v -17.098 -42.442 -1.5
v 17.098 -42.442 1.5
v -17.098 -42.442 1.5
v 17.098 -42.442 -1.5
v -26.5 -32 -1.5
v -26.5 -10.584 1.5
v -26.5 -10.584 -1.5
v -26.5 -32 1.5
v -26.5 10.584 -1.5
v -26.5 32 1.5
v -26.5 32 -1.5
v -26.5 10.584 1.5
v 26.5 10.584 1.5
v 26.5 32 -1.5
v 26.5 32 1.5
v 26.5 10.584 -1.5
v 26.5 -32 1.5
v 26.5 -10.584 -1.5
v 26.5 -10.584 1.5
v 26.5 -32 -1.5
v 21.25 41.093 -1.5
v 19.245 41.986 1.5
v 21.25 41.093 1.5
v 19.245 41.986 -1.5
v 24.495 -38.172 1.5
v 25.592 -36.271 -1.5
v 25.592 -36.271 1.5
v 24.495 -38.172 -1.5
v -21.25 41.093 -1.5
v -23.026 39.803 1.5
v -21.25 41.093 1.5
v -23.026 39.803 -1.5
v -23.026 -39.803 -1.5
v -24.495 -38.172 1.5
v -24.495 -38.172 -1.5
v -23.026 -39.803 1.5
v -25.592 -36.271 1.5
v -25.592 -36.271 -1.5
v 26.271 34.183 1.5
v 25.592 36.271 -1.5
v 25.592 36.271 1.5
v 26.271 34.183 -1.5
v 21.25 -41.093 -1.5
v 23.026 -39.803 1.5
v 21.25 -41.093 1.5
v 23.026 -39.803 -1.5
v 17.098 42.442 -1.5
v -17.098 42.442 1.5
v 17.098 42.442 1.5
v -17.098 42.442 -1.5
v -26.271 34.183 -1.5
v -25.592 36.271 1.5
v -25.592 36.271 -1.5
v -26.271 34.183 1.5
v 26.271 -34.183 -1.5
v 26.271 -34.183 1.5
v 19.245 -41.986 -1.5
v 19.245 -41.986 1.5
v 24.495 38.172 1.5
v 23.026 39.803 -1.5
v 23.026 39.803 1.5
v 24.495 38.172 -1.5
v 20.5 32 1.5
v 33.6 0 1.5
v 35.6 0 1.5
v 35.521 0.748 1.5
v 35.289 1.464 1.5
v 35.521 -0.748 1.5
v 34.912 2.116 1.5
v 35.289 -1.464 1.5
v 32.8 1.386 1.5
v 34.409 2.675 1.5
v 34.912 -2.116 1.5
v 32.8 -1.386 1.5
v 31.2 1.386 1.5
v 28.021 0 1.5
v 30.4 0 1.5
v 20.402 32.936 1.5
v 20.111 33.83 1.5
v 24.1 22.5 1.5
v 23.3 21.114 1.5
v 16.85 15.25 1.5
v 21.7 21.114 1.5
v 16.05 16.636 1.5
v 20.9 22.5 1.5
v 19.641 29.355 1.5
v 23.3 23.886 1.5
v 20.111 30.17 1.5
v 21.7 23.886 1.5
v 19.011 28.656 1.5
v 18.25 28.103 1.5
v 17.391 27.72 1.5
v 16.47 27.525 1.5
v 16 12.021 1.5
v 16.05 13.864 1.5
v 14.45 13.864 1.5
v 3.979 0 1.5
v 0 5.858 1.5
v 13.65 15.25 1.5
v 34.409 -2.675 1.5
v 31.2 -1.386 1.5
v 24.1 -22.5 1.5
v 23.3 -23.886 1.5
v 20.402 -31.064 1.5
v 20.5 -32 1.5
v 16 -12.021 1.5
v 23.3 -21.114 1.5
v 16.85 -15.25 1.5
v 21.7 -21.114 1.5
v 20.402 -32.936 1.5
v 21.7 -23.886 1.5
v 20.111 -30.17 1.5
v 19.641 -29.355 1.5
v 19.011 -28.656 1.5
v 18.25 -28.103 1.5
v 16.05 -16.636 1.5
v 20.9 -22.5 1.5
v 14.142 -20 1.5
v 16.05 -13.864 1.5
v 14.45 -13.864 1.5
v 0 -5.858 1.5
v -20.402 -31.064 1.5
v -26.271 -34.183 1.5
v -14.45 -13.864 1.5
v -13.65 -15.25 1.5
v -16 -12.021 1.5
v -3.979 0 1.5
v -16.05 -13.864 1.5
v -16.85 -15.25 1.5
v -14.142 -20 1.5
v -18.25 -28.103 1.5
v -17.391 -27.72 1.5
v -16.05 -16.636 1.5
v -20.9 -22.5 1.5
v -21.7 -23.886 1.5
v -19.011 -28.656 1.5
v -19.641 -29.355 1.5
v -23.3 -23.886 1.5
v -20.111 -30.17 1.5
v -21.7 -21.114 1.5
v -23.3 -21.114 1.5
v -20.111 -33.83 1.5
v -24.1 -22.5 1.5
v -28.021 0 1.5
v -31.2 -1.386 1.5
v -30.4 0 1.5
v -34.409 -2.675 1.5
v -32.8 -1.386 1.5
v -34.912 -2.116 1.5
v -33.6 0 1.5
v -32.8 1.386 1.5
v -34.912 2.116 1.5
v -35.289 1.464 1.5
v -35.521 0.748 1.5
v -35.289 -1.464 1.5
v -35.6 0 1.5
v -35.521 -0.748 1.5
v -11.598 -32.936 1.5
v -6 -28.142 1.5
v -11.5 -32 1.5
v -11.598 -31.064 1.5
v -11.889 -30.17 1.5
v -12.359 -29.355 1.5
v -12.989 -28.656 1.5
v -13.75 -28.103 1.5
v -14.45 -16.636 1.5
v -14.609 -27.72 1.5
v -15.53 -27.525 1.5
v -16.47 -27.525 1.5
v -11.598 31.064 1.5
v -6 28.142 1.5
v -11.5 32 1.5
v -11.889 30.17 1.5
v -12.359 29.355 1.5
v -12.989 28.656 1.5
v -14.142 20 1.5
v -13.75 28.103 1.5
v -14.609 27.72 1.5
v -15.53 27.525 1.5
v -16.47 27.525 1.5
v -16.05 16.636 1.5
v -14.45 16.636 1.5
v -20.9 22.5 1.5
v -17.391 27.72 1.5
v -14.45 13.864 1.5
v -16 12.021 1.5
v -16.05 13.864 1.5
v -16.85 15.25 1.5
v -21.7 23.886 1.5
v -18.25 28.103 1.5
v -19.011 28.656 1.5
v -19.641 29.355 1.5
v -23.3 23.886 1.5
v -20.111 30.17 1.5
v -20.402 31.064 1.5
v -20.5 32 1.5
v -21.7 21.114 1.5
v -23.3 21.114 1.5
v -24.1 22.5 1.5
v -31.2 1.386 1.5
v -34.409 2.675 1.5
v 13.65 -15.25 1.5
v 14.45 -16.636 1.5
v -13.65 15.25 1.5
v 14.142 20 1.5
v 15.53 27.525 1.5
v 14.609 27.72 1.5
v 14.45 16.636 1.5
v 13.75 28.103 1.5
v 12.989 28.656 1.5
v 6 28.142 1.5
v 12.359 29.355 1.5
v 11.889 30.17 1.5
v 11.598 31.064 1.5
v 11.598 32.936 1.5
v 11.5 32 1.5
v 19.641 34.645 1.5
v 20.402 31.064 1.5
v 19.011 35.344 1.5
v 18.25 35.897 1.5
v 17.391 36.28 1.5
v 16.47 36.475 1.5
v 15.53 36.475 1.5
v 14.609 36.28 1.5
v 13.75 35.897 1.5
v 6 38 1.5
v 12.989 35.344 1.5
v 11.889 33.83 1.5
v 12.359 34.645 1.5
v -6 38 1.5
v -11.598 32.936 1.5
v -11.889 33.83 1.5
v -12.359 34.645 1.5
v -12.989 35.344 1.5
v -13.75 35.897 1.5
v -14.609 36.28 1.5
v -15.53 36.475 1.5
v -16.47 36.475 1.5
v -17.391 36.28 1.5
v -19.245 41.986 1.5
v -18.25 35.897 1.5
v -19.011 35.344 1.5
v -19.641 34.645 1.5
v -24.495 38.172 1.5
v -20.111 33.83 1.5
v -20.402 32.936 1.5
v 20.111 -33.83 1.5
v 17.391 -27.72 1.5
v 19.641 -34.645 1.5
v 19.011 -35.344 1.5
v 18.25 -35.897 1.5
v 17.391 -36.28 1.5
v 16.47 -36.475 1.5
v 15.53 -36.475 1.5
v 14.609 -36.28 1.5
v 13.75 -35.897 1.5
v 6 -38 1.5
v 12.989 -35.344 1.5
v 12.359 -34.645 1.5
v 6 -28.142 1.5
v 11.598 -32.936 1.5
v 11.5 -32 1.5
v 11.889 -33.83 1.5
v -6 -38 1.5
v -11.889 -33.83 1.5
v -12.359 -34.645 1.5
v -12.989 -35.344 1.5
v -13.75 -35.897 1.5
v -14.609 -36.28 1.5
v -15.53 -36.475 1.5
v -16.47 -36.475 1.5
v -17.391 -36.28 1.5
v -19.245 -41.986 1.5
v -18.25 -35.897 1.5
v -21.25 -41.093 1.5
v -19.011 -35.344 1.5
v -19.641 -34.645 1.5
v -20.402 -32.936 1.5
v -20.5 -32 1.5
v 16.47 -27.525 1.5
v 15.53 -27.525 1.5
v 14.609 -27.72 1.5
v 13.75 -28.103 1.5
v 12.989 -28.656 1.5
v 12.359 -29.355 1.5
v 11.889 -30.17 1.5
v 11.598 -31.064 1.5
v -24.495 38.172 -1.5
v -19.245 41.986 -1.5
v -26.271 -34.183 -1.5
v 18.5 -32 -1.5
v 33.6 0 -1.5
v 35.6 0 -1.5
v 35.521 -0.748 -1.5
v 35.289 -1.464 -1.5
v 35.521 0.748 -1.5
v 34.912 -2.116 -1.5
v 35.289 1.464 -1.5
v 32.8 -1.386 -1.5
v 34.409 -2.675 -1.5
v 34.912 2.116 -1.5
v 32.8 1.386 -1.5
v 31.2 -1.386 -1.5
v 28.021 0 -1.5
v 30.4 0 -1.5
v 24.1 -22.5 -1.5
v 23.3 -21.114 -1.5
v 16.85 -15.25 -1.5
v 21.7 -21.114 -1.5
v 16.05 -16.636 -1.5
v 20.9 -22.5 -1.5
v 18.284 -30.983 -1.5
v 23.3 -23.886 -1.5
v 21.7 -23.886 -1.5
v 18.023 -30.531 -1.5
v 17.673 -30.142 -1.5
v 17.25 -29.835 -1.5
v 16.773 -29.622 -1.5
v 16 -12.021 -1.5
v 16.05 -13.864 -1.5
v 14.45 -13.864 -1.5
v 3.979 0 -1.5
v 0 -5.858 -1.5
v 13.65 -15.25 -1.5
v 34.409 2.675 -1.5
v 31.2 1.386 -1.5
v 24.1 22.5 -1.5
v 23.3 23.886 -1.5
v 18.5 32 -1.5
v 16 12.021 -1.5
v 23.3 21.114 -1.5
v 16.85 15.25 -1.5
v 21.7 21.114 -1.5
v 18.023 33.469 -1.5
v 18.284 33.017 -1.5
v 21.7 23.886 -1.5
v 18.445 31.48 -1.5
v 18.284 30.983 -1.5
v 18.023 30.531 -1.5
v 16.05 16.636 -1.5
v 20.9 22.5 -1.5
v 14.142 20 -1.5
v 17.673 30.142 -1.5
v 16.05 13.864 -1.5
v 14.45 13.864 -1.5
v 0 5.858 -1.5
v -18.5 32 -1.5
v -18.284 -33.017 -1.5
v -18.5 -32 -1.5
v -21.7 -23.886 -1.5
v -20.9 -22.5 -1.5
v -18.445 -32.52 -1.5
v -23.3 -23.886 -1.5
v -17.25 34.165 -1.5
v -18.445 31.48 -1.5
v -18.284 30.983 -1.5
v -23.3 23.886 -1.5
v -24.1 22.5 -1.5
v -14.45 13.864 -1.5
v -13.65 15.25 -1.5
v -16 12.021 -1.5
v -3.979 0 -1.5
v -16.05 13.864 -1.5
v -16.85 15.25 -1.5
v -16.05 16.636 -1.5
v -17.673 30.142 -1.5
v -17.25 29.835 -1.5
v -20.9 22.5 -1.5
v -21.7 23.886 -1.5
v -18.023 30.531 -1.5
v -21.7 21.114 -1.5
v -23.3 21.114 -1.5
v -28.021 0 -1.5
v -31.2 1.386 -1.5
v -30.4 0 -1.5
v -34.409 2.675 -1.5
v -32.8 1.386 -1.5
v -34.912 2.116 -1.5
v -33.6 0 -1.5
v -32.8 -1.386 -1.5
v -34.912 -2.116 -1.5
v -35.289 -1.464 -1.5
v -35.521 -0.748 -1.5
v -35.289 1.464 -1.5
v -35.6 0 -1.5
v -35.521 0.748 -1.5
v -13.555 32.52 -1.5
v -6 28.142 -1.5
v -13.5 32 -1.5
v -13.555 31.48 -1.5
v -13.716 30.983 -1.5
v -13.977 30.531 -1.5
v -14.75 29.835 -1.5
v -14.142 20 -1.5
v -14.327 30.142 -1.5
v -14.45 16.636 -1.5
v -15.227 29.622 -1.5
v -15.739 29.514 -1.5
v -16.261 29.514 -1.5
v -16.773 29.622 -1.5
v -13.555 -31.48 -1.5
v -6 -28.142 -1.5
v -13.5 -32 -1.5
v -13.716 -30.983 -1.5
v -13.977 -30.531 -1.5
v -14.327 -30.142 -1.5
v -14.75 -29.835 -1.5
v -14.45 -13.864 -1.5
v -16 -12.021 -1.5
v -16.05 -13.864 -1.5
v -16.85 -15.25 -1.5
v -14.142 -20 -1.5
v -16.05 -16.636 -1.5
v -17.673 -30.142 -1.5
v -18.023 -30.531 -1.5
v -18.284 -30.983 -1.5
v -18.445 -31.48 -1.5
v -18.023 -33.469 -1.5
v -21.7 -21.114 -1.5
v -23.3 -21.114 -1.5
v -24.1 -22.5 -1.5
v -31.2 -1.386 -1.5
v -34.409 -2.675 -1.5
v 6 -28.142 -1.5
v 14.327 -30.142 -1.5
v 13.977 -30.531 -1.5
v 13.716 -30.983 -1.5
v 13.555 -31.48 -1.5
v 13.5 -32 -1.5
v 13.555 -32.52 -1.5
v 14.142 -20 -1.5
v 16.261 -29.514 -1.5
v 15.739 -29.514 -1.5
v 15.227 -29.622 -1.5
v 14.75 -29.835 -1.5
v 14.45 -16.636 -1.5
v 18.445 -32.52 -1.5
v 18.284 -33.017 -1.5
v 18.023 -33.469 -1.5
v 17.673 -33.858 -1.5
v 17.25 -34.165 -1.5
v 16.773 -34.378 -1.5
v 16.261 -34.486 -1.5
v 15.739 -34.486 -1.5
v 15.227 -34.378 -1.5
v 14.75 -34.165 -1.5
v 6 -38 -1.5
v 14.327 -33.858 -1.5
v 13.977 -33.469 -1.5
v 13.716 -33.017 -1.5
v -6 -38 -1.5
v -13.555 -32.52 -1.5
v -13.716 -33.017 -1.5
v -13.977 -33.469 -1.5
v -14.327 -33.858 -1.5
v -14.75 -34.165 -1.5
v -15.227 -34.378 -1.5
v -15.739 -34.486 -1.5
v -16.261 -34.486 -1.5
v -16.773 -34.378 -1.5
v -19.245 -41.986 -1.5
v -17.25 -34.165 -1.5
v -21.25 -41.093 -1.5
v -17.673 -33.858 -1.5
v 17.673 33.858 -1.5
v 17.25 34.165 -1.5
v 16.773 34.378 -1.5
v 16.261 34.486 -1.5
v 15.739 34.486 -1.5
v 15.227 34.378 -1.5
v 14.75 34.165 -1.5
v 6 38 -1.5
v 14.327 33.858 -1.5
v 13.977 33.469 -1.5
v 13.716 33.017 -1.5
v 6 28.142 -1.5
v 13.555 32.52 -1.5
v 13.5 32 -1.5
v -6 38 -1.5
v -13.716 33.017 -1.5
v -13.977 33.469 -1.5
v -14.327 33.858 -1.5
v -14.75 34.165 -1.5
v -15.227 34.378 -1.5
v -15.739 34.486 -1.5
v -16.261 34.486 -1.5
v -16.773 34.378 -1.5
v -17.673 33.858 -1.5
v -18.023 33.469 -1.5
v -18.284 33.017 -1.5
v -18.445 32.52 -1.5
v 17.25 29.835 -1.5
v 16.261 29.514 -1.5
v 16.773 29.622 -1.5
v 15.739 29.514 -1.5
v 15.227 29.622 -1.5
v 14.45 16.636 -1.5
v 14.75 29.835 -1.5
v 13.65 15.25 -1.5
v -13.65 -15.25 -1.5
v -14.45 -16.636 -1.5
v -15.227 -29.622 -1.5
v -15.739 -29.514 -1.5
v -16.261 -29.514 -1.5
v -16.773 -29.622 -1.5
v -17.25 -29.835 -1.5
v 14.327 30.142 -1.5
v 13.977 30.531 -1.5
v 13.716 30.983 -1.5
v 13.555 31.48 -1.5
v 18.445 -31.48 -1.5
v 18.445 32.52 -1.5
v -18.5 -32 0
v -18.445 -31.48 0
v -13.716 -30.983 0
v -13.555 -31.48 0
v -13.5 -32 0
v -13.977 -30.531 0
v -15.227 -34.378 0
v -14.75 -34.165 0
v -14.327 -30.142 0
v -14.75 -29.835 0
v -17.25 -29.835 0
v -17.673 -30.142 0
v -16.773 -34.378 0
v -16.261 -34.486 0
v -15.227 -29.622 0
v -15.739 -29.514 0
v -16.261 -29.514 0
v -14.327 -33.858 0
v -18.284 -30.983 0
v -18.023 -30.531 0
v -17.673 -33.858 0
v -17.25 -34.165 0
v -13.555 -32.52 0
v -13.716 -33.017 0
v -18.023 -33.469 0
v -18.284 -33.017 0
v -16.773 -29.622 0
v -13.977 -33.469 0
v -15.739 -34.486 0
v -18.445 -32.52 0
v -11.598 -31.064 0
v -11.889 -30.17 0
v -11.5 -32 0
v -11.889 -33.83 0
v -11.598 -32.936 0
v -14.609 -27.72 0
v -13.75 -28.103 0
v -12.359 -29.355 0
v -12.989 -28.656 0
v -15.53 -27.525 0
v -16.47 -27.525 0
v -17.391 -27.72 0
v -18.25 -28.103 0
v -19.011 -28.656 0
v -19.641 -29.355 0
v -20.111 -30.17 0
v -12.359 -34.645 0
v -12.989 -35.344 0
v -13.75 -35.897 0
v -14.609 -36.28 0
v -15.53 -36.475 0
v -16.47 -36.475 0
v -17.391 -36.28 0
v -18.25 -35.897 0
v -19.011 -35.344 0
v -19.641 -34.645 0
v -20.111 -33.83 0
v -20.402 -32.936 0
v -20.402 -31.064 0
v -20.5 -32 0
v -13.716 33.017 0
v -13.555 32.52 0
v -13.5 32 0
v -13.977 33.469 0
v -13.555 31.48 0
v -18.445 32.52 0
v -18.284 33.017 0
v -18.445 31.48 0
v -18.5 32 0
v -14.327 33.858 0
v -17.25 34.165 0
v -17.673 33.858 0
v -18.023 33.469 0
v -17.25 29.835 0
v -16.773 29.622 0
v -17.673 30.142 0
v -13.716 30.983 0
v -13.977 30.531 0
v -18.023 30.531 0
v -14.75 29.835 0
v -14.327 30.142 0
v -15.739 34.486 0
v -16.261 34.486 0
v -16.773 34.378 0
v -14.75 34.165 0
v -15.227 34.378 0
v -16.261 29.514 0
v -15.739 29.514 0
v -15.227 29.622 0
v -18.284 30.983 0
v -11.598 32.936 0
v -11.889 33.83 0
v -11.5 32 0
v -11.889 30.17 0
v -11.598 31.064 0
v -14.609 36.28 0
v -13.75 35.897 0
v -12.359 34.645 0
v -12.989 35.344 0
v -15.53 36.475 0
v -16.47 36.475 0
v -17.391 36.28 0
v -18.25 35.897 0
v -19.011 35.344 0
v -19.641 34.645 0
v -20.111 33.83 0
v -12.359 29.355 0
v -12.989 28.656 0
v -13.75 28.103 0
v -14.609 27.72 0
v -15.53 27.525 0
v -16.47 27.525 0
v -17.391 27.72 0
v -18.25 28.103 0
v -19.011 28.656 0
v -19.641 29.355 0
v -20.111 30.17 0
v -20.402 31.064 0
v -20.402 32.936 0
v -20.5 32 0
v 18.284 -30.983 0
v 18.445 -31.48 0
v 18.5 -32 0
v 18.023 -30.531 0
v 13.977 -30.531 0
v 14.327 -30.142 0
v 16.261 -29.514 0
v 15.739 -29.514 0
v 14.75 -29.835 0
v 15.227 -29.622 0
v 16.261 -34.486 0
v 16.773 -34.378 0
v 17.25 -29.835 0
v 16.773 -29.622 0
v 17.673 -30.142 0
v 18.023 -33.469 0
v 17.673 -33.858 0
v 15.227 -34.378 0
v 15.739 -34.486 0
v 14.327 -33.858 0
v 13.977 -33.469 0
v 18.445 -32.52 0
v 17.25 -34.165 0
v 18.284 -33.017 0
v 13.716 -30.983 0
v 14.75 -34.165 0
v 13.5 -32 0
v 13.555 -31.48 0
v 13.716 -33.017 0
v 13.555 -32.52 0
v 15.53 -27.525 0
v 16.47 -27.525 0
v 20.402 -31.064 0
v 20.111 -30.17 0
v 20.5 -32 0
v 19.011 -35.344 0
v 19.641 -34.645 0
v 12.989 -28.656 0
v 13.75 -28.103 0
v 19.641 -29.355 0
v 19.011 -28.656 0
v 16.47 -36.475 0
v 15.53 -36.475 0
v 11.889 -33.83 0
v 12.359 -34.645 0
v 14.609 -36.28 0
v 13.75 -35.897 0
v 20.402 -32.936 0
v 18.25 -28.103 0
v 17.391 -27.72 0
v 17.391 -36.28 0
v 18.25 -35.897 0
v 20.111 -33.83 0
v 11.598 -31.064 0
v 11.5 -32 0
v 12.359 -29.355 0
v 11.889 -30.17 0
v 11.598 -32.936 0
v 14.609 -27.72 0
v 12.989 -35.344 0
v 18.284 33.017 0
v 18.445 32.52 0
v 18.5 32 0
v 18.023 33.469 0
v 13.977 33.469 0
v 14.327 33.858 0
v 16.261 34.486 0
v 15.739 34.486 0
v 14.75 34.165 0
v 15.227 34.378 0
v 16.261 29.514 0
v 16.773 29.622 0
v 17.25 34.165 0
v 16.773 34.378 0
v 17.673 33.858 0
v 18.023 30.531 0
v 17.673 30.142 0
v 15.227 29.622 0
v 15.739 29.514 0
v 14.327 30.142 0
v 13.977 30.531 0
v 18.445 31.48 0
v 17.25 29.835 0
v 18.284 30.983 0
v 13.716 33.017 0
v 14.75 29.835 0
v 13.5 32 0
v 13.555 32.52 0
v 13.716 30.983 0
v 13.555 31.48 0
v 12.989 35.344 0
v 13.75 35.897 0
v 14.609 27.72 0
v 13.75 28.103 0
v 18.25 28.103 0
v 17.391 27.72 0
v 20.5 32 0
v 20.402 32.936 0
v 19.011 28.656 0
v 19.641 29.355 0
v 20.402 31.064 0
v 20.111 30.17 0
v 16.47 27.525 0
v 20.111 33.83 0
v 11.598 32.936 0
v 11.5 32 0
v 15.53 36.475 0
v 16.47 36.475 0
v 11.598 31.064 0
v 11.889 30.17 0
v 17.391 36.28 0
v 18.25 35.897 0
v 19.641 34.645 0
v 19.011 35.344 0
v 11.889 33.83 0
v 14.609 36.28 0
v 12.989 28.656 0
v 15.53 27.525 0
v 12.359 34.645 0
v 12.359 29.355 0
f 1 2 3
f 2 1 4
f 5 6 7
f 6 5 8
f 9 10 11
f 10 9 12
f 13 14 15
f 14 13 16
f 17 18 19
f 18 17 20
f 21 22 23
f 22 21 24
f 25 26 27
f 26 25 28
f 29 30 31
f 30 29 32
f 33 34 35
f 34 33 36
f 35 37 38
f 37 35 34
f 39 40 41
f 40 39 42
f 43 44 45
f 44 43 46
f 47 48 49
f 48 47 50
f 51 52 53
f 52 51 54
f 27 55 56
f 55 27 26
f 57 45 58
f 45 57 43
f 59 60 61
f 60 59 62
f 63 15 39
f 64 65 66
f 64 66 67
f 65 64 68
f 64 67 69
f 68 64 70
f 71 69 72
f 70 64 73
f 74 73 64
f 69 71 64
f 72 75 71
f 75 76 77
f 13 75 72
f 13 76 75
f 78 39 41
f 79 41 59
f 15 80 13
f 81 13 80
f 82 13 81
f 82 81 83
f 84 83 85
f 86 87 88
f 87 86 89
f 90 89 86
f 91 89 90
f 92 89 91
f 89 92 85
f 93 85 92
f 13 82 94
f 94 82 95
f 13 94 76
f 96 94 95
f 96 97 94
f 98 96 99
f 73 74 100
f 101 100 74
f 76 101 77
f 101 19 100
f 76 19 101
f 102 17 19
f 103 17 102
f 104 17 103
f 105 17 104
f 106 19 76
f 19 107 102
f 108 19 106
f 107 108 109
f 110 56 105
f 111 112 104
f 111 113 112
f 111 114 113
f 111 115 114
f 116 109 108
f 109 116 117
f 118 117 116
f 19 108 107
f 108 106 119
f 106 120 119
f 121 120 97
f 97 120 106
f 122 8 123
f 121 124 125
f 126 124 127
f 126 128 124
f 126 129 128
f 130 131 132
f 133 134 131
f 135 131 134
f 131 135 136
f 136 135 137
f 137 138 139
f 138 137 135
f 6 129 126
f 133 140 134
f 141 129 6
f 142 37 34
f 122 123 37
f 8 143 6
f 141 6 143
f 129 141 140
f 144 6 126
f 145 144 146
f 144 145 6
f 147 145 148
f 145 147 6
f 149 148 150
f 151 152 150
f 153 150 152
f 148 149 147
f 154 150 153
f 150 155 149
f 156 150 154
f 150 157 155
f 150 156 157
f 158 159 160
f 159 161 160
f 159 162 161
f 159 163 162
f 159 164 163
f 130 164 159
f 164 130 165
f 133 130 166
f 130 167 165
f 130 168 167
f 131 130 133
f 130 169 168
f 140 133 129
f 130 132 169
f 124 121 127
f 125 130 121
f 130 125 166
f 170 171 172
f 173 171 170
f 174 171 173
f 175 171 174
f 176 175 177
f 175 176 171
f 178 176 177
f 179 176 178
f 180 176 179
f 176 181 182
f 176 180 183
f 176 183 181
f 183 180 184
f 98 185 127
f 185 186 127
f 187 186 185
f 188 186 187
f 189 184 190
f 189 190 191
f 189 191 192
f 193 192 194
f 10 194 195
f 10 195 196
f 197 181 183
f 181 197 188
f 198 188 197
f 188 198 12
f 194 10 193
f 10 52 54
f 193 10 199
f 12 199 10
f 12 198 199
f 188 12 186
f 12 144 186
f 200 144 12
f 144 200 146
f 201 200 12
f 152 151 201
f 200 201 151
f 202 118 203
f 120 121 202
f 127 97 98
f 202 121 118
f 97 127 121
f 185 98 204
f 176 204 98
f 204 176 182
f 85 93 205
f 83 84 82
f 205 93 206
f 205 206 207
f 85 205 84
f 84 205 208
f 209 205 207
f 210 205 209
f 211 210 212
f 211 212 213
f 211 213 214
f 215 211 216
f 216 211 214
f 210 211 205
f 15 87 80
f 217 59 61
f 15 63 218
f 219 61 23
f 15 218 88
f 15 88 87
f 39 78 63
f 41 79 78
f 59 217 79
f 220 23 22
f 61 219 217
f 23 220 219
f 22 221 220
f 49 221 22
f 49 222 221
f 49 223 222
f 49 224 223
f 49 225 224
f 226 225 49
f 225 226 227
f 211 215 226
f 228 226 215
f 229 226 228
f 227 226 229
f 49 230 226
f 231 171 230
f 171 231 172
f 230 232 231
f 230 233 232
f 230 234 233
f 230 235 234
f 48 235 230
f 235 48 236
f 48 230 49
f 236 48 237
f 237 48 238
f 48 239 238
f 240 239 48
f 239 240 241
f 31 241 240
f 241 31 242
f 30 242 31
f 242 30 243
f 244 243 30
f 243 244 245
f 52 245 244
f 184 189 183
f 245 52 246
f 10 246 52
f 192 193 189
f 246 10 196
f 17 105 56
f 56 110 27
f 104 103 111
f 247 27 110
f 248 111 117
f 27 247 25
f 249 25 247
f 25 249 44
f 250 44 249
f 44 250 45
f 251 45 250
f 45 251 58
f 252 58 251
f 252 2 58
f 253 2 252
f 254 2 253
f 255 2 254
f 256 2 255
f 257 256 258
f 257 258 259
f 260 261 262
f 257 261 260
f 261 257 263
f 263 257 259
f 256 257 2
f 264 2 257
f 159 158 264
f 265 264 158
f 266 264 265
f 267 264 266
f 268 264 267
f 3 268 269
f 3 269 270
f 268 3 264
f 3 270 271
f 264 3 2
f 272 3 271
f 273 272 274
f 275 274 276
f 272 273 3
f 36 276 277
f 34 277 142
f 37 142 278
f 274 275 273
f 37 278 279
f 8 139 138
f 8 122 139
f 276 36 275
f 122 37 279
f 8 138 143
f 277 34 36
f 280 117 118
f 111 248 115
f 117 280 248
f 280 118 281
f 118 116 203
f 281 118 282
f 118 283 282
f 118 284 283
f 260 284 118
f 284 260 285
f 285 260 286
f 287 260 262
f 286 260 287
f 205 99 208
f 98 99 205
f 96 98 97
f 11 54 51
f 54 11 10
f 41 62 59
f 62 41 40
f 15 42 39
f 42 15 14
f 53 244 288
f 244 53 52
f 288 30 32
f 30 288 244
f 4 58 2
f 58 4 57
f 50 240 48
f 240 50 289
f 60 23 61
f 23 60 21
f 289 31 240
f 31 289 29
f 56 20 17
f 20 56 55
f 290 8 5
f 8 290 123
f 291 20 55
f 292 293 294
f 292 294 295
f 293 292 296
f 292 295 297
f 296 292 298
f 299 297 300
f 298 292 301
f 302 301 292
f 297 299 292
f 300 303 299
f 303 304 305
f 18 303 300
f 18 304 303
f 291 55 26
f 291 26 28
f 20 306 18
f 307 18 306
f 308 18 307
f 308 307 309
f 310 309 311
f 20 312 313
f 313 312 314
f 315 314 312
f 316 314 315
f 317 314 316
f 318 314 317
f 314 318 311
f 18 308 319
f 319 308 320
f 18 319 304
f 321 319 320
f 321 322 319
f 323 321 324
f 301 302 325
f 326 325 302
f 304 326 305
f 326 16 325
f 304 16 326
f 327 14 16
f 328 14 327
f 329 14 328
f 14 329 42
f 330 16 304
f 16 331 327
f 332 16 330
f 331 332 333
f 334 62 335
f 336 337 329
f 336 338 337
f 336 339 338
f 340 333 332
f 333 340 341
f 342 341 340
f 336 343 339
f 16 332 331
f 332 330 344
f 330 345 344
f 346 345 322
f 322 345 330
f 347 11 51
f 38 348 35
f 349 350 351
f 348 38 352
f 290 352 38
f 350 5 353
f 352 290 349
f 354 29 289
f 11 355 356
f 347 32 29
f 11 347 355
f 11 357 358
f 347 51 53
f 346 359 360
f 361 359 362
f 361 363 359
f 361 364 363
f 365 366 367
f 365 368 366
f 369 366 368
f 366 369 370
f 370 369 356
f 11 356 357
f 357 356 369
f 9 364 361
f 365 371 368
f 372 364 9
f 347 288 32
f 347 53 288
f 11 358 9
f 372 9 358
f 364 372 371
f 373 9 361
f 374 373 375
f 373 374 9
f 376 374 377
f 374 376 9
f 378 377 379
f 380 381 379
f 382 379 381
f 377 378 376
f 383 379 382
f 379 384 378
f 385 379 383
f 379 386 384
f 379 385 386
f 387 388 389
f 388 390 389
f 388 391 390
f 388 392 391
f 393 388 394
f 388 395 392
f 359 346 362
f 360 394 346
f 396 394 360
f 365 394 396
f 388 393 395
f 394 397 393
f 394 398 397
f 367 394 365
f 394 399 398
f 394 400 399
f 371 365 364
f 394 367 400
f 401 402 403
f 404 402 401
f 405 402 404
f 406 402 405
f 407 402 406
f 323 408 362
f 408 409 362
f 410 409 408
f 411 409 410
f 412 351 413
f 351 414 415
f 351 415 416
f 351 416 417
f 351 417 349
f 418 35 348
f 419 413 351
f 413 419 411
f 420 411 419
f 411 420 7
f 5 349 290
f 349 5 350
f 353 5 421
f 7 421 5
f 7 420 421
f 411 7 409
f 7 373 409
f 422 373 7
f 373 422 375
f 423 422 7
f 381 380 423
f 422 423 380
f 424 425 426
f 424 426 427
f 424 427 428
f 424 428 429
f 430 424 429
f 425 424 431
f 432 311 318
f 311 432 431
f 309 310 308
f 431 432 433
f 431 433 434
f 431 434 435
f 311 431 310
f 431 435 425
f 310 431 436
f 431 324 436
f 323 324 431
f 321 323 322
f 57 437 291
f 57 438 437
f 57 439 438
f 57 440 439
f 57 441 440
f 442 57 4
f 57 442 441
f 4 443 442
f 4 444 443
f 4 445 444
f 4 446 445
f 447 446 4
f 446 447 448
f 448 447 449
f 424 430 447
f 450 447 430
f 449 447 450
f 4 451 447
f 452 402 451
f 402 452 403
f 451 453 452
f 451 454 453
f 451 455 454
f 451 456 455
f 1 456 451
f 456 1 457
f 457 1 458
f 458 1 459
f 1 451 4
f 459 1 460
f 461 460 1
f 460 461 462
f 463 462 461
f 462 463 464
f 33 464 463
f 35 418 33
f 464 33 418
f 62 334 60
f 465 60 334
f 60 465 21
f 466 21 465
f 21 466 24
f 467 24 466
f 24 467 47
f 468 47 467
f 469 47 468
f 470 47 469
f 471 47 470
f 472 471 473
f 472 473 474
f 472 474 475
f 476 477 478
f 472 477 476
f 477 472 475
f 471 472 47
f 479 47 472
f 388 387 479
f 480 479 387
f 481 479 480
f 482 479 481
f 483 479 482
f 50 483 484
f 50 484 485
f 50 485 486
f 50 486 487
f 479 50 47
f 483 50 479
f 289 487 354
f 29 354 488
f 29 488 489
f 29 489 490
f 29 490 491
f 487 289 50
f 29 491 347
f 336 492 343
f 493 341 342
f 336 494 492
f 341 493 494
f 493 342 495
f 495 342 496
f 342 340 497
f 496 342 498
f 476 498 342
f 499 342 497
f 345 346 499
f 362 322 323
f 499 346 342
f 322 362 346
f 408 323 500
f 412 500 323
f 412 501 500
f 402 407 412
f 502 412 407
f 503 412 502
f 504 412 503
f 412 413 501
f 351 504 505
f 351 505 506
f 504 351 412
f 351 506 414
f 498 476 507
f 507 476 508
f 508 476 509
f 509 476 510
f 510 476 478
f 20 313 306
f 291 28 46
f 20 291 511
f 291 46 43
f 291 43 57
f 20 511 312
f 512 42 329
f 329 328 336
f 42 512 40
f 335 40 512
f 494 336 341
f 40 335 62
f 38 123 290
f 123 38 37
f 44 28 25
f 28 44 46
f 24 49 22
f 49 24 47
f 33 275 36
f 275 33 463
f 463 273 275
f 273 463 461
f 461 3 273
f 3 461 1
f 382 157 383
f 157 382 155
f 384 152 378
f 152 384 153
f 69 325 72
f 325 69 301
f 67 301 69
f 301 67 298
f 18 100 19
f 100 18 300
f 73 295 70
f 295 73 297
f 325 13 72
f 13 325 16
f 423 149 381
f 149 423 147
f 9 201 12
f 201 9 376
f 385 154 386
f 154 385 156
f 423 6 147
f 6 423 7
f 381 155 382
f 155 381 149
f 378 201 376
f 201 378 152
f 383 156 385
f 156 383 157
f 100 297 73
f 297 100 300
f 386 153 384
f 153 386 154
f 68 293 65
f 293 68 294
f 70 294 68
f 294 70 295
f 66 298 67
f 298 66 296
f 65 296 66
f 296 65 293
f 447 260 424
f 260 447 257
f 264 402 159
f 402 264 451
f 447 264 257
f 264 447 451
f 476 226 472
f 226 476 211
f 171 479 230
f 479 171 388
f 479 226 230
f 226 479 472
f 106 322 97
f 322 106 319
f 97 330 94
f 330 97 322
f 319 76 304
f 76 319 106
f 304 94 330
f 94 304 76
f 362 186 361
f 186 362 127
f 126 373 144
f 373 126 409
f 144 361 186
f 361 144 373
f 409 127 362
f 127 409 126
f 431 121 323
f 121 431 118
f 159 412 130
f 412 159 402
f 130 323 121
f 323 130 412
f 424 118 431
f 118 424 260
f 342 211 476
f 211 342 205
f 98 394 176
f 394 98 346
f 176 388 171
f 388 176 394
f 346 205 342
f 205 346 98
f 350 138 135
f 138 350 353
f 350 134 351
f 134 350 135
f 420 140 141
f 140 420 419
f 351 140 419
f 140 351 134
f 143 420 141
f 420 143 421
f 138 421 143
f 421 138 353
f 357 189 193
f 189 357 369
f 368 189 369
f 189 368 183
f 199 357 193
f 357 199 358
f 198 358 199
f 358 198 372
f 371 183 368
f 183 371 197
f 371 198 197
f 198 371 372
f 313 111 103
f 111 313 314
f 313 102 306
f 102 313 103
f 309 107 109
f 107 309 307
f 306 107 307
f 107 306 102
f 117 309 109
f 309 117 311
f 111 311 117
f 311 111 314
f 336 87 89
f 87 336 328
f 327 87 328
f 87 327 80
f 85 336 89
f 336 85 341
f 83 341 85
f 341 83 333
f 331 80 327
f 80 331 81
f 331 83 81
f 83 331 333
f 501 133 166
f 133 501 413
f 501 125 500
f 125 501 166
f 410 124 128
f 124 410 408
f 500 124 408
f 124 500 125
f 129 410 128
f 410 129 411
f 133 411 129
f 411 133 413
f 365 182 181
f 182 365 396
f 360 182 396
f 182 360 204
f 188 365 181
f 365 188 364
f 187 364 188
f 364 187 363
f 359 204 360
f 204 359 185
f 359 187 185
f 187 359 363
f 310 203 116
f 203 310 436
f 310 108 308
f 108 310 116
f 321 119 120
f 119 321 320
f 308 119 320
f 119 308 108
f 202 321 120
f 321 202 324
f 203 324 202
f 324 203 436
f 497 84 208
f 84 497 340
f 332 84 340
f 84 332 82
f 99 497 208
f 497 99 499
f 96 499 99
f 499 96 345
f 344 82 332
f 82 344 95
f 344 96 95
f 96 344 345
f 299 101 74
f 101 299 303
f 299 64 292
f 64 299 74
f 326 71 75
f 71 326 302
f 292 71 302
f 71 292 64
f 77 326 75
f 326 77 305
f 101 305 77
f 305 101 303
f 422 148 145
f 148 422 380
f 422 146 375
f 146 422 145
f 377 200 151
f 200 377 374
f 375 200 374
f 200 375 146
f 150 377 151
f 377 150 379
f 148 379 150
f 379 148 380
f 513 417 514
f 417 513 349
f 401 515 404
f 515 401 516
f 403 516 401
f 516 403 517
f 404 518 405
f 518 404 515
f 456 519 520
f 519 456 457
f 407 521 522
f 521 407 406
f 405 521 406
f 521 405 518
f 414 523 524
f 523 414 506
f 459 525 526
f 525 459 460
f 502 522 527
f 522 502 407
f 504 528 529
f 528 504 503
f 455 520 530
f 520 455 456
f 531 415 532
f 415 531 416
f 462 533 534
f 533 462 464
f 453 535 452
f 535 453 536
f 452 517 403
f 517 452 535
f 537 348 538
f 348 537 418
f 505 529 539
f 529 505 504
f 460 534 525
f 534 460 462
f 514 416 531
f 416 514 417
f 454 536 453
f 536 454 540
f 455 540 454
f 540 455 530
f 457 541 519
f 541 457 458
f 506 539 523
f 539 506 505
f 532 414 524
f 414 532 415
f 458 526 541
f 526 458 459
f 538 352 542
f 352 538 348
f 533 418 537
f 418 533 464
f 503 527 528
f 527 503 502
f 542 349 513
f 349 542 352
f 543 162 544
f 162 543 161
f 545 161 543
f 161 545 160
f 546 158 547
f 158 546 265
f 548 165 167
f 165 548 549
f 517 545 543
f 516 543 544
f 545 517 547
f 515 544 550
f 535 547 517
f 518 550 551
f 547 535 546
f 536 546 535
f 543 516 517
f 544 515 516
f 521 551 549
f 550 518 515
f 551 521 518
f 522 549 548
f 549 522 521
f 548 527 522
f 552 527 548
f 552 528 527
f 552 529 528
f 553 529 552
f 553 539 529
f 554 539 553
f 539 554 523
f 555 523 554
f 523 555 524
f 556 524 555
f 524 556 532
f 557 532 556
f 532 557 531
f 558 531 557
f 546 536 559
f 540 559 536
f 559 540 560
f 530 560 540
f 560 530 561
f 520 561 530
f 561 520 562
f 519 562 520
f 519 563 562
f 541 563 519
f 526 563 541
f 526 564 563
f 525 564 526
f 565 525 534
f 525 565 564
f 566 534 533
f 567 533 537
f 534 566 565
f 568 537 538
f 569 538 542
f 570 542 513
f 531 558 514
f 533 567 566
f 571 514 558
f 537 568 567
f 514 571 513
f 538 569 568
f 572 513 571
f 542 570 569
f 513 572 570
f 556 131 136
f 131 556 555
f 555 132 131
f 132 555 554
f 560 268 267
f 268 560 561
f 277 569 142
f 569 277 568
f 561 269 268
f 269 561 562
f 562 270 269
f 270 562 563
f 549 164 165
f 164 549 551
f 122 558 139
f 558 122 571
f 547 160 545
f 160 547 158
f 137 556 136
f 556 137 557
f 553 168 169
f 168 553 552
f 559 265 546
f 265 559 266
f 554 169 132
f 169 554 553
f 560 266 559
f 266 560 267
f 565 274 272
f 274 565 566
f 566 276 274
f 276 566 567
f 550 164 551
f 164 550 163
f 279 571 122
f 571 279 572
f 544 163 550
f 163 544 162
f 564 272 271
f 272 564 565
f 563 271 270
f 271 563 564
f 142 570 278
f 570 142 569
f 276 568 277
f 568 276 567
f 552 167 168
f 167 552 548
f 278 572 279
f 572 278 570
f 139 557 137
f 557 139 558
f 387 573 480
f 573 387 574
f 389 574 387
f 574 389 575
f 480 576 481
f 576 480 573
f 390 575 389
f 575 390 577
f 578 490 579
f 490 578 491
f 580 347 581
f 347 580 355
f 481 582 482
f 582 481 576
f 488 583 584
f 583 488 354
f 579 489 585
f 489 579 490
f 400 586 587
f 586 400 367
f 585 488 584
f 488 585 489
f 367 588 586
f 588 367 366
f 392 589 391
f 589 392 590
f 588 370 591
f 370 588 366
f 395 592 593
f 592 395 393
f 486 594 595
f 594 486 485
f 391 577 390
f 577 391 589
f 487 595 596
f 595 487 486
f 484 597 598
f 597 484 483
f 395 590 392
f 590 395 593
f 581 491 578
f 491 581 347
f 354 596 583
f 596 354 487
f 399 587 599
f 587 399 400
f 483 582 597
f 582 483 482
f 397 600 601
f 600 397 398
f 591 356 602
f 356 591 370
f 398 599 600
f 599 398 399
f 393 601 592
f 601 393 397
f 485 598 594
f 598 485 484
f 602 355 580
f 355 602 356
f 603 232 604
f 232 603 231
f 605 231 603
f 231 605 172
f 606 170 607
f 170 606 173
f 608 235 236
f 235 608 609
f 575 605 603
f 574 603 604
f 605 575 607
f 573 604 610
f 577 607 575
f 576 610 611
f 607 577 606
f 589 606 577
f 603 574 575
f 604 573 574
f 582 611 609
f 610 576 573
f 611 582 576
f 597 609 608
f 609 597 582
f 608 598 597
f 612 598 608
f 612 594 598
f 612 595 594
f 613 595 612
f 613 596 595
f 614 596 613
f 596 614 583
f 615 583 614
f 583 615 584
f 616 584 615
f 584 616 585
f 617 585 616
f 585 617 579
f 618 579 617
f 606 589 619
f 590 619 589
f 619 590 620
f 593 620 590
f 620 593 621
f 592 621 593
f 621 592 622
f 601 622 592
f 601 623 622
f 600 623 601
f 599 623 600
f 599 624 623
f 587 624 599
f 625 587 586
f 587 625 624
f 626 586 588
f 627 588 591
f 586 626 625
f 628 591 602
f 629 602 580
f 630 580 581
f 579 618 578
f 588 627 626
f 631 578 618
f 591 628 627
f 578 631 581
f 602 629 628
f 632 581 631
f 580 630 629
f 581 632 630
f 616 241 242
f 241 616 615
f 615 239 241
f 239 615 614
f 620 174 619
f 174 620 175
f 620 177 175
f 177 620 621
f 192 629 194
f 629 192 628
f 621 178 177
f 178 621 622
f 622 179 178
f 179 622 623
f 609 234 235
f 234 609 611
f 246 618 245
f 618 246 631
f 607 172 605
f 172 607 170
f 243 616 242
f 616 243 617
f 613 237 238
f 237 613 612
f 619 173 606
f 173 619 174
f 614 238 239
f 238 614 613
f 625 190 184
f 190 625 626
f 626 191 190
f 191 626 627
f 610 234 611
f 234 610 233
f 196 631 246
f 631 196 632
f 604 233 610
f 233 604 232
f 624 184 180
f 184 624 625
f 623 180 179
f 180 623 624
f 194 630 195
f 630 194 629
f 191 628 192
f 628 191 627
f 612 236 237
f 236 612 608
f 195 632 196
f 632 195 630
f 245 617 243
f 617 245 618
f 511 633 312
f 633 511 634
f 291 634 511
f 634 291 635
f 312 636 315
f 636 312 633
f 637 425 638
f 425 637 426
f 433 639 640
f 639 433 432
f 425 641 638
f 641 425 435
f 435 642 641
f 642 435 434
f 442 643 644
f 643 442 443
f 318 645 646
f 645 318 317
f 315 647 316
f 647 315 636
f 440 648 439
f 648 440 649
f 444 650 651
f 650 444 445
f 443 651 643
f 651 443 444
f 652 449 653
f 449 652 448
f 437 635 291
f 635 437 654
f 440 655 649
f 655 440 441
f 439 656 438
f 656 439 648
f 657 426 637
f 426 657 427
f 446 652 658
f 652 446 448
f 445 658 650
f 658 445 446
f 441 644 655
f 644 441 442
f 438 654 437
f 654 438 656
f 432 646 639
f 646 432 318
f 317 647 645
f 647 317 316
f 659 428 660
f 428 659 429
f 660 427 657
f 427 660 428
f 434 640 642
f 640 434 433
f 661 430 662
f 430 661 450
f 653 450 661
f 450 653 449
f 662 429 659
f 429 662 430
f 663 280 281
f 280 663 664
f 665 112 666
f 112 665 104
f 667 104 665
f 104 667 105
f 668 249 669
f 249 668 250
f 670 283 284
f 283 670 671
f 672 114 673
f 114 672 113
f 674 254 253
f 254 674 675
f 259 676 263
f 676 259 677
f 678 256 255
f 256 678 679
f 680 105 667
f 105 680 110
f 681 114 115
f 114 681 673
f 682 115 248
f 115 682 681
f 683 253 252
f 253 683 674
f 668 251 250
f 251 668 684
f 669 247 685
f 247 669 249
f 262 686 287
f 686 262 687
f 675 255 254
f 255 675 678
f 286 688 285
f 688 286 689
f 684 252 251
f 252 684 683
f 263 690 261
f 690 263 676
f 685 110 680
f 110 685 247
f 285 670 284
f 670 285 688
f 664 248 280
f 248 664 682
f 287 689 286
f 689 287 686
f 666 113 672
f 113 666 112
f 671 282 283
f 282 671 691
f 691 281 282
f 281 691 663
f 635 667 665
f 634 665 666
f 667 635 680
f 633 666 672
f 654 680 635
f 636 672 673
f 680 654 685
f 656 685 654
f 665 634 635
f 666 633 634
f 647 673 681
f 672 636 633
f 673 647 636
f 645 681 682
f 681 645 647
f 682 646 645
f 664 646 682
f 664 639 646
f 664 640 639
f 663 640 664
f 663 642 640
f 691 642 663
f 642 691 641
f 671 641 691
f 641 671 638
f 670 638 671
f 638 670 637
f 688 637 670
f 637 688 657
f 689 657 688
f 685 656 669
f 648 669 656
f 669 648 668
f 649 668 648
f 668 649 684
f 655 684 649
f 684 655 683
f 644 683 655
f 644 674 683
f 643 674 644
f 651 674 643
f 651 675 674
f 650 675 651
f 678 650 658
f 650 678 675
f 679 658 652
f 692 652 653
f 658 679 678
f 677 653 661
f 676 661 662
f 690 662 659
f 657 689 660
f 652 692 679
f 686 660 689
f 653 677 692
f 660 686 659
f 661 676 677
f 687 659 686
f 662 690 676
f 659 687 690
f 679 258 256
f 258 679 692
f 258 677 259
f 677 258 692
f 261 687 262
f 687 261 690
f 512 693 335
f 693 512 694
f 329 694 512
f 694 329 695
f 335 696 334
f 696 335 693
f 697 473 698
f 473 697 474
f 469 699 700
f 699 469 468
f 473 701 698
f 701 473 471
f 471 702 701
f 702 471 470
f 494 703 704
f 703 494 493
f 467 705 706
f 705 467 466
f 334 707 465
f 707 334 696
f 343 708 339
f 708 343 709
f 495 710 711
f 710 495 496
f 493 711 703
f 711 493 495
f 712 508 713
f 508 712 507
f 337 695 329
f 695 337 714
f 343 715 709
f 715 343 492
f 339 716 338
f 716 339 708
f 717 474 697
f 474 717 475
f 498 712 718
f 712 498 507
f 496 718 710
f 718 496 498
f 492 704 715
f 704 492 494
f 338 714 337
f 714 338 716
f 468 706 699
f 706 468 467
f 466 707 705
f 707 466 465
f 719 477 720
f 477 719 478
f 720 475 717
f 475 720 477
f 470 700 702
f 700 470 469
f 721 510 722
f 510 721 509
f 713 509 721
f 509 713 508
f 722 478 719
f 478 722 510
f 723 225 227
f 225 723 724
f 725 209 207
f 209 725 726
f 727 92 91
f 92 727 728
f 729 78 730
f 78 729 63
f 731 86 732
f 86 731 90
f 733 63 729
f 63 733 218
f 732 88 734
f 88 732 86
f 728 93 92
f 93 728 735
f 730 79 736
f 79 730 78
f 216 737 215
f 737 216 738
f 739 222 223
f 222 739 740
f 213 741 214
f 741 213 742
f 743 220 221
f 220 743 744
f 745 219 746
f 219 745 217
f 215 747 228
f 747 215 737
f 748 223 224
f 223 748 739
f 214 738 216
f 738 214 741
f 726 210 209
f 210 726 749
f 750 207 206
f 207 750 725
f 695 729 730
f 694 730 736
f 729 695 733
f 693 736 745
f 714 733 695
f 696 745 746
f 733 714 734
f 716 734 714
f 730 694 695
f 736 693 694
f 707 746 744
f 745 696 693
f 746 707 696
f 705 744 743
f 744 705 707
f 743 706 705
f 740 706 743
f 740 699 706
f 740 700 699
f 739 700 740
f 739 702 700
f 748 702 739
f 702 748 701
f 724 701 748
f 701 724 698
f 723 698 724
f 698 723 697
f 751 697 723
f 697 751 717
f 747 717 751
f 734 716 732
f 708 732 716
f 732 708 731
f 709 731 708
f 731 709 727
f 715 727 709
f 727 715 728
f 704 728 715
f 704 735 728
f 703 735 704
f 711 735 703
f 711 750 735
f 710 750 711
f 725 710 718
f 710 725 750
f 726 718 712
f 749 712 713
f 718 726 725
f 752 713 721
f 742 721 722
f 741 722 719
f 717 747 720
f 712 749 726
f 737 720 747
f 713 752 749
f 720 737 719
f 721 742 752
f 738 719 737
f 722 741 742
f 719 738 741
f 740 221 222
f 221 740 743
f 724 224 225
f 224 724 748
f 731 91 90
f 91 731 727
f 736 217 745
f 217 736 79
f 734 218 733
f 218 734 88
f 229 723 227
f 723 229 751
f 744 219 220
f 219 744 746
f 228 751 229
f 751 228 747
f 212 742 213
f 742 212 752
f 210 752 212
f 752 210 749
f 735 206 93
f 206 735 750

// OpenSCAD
//**********************************************************************
//* Naze32 Flight Controller Mount                                     *
//* by Mike Leigh - June 2016                                          *
//* Mount based on "Crossfire2" design by MickeyB                      *
//* (http://www.thingiverse.com/thing:234867)                          *
//* CC BY-NC 3.0                                                       *
//* http://creativecommons.org/licenses/by-nc/3.0/                     *
//**********************************************************************

// width
x = 50;
// length
y = 85;
// height
z = 3;

// dampener dimensions
dampner_hole = 5;
dampner_cutout = 9;

difference() {

    // base, union of 2 hulls
    union() {
        // external corners
        hull() {
            translate([-16, -32, z / 2 * -1]) cylinder(r = dampner_cutout / 2 + 6, h = z, $fn = 30);
            translate([-16, 32, z / 2 * -1]) cylinder(r = dampner_cutout / 2 + 6, h = z, $fn = 30);
            translate([16, -32, z / 2 * -1]) cylinder(r = dampner_cutout / 2 + 6, h = z, $fn = 30);
            translate([16, 32, z / 2 * -1]) cylinder(r = dampner_cutout / 2 + 6, h = z, $fn = 30);
        }
        // 64mm middle supports
        hull() {
            translate([0, -32, (z / 2) * -1]) cylinder(r = 3.6, h = z, $fn = 30);
            translate([-32, 0, (z / 2) * -1]) cylinder(r = 3.6, h = z, $fn = 30);
            translate([32, 0, (z / 2) * -1]) cylinder(r = 3.6, h = z, $fn = 30);
            translate([0, 32, (z / 2) * -1]) cylinder(r = 3.6, h = z, $fn = 30);
        }
    }

    // rectangle cutouts
    translate([0, -30, 0]) cube([12, 16, z + .2], center=true);
    translate([0, 30, 0]) cube([12, 16, z + .2], center=true);

    // 17mm rotated rectangular cutouts
    translate([16, 0, 0]) rotate([0,0,45]) cube([17, 17, z + .2], center=true);
    translate([-16, 0, 0]) rotate([0,0,45]) cube([17, 17, z + .2], center=true);

    // 20mm rotated rectangular cutouts
    translate([0, -20, 0]) rotate([0,0,45]) cube([20, 20, z + .2], center=true);
    translate([0, 20, 0]) rotate([0,0,45]) cube([20, 20, z + .2], center=true);

    // 45mm square fixing holes
    translate([-22.5, -22.5, (z / 2) * -1 -.1]) cylinder(r = 1.6, h = z + .2, $fn = 6);
    translate([-22.5, 22.5, (z / 2) * -1 -.1]) cylinder(r = 1.6, h = z + .2, $fn = 6);
    translate([22.5, -22.5, (z / 2) * -1 -.1]) cylinder(r = 1.6, h = z + .2, $fn = 6);
    translate([22.5, 22.5, (z / 2) * -1 -.1]) cylinder(r = 1.6, h = z + .2, $fn = 6);

    // 30.5mm square fixing holes
    translate([-15.25, -15.25, (z / 2) * -1 -.1]) cylinder(r = 1.6, h = z + .2, $fn = 6);
    translate([-15.25, 15.25, (z / 2) * -1 -.1]) cylinder(r = 1.6, h = z + .2, $fn = 6);
    translate([15.25, -15.25, (z / 2) * -1 -.1]) cylinder(r = 1.6, h = z + .2, $fn = 6);
    translate([15.25, 15.25, (z / 2) * -1 -.1]) cylinder(r = 1.6, h = z + .2, $fn = 6);

    // 64mm spaced x axis holes
    translate([32, 0, (z / 2) * -1 -.1]) cylinder(r = 1.6, h = z + .2, $fn = 6);
    translate([-32, 0, (z / 2) * -1 -.1]) cylinder(r = 1.6, h = z + .2, $fn = 6);

    // 64 x 32 hole centres (dampeners)
    translate([-16, -32, (z / 2) * -1 -.1]) cylinder(r = dampner_hole / 2, h = z + .2, $fn = 30);
    translate([-16, -32, 0]) cylinder(r = dampner_cutout / 2, h = z, $fn = 30);
    translate([-16, 32, (z / 2) * -1 -.1]) cylinder(r = dampner_hole / 2, h = z + .2, $fn = 30);
    translate([-16, 32, 0]) cylinder(r = dampner_cutout / 2, h = z, $fn = 30);
    translate([16, -32, (z / 2) * -1 -.1]) cylinder(r = dampner_hole / 2, h = z + .2, $fn = 30);
    translate([16, -32, 0]) cylinder(r = dampner_cutout / 2, h = z, $fn = 30);
    translate([16, 32, (z / 2) * -1 -.1]) cylinder(r = dampner_hole / 2, h = z + .2, $fn = 30);
    translate([16, 32, 0]) cylinder(r = dampner_cutout / 2, h = z, $fn = 30);

}
